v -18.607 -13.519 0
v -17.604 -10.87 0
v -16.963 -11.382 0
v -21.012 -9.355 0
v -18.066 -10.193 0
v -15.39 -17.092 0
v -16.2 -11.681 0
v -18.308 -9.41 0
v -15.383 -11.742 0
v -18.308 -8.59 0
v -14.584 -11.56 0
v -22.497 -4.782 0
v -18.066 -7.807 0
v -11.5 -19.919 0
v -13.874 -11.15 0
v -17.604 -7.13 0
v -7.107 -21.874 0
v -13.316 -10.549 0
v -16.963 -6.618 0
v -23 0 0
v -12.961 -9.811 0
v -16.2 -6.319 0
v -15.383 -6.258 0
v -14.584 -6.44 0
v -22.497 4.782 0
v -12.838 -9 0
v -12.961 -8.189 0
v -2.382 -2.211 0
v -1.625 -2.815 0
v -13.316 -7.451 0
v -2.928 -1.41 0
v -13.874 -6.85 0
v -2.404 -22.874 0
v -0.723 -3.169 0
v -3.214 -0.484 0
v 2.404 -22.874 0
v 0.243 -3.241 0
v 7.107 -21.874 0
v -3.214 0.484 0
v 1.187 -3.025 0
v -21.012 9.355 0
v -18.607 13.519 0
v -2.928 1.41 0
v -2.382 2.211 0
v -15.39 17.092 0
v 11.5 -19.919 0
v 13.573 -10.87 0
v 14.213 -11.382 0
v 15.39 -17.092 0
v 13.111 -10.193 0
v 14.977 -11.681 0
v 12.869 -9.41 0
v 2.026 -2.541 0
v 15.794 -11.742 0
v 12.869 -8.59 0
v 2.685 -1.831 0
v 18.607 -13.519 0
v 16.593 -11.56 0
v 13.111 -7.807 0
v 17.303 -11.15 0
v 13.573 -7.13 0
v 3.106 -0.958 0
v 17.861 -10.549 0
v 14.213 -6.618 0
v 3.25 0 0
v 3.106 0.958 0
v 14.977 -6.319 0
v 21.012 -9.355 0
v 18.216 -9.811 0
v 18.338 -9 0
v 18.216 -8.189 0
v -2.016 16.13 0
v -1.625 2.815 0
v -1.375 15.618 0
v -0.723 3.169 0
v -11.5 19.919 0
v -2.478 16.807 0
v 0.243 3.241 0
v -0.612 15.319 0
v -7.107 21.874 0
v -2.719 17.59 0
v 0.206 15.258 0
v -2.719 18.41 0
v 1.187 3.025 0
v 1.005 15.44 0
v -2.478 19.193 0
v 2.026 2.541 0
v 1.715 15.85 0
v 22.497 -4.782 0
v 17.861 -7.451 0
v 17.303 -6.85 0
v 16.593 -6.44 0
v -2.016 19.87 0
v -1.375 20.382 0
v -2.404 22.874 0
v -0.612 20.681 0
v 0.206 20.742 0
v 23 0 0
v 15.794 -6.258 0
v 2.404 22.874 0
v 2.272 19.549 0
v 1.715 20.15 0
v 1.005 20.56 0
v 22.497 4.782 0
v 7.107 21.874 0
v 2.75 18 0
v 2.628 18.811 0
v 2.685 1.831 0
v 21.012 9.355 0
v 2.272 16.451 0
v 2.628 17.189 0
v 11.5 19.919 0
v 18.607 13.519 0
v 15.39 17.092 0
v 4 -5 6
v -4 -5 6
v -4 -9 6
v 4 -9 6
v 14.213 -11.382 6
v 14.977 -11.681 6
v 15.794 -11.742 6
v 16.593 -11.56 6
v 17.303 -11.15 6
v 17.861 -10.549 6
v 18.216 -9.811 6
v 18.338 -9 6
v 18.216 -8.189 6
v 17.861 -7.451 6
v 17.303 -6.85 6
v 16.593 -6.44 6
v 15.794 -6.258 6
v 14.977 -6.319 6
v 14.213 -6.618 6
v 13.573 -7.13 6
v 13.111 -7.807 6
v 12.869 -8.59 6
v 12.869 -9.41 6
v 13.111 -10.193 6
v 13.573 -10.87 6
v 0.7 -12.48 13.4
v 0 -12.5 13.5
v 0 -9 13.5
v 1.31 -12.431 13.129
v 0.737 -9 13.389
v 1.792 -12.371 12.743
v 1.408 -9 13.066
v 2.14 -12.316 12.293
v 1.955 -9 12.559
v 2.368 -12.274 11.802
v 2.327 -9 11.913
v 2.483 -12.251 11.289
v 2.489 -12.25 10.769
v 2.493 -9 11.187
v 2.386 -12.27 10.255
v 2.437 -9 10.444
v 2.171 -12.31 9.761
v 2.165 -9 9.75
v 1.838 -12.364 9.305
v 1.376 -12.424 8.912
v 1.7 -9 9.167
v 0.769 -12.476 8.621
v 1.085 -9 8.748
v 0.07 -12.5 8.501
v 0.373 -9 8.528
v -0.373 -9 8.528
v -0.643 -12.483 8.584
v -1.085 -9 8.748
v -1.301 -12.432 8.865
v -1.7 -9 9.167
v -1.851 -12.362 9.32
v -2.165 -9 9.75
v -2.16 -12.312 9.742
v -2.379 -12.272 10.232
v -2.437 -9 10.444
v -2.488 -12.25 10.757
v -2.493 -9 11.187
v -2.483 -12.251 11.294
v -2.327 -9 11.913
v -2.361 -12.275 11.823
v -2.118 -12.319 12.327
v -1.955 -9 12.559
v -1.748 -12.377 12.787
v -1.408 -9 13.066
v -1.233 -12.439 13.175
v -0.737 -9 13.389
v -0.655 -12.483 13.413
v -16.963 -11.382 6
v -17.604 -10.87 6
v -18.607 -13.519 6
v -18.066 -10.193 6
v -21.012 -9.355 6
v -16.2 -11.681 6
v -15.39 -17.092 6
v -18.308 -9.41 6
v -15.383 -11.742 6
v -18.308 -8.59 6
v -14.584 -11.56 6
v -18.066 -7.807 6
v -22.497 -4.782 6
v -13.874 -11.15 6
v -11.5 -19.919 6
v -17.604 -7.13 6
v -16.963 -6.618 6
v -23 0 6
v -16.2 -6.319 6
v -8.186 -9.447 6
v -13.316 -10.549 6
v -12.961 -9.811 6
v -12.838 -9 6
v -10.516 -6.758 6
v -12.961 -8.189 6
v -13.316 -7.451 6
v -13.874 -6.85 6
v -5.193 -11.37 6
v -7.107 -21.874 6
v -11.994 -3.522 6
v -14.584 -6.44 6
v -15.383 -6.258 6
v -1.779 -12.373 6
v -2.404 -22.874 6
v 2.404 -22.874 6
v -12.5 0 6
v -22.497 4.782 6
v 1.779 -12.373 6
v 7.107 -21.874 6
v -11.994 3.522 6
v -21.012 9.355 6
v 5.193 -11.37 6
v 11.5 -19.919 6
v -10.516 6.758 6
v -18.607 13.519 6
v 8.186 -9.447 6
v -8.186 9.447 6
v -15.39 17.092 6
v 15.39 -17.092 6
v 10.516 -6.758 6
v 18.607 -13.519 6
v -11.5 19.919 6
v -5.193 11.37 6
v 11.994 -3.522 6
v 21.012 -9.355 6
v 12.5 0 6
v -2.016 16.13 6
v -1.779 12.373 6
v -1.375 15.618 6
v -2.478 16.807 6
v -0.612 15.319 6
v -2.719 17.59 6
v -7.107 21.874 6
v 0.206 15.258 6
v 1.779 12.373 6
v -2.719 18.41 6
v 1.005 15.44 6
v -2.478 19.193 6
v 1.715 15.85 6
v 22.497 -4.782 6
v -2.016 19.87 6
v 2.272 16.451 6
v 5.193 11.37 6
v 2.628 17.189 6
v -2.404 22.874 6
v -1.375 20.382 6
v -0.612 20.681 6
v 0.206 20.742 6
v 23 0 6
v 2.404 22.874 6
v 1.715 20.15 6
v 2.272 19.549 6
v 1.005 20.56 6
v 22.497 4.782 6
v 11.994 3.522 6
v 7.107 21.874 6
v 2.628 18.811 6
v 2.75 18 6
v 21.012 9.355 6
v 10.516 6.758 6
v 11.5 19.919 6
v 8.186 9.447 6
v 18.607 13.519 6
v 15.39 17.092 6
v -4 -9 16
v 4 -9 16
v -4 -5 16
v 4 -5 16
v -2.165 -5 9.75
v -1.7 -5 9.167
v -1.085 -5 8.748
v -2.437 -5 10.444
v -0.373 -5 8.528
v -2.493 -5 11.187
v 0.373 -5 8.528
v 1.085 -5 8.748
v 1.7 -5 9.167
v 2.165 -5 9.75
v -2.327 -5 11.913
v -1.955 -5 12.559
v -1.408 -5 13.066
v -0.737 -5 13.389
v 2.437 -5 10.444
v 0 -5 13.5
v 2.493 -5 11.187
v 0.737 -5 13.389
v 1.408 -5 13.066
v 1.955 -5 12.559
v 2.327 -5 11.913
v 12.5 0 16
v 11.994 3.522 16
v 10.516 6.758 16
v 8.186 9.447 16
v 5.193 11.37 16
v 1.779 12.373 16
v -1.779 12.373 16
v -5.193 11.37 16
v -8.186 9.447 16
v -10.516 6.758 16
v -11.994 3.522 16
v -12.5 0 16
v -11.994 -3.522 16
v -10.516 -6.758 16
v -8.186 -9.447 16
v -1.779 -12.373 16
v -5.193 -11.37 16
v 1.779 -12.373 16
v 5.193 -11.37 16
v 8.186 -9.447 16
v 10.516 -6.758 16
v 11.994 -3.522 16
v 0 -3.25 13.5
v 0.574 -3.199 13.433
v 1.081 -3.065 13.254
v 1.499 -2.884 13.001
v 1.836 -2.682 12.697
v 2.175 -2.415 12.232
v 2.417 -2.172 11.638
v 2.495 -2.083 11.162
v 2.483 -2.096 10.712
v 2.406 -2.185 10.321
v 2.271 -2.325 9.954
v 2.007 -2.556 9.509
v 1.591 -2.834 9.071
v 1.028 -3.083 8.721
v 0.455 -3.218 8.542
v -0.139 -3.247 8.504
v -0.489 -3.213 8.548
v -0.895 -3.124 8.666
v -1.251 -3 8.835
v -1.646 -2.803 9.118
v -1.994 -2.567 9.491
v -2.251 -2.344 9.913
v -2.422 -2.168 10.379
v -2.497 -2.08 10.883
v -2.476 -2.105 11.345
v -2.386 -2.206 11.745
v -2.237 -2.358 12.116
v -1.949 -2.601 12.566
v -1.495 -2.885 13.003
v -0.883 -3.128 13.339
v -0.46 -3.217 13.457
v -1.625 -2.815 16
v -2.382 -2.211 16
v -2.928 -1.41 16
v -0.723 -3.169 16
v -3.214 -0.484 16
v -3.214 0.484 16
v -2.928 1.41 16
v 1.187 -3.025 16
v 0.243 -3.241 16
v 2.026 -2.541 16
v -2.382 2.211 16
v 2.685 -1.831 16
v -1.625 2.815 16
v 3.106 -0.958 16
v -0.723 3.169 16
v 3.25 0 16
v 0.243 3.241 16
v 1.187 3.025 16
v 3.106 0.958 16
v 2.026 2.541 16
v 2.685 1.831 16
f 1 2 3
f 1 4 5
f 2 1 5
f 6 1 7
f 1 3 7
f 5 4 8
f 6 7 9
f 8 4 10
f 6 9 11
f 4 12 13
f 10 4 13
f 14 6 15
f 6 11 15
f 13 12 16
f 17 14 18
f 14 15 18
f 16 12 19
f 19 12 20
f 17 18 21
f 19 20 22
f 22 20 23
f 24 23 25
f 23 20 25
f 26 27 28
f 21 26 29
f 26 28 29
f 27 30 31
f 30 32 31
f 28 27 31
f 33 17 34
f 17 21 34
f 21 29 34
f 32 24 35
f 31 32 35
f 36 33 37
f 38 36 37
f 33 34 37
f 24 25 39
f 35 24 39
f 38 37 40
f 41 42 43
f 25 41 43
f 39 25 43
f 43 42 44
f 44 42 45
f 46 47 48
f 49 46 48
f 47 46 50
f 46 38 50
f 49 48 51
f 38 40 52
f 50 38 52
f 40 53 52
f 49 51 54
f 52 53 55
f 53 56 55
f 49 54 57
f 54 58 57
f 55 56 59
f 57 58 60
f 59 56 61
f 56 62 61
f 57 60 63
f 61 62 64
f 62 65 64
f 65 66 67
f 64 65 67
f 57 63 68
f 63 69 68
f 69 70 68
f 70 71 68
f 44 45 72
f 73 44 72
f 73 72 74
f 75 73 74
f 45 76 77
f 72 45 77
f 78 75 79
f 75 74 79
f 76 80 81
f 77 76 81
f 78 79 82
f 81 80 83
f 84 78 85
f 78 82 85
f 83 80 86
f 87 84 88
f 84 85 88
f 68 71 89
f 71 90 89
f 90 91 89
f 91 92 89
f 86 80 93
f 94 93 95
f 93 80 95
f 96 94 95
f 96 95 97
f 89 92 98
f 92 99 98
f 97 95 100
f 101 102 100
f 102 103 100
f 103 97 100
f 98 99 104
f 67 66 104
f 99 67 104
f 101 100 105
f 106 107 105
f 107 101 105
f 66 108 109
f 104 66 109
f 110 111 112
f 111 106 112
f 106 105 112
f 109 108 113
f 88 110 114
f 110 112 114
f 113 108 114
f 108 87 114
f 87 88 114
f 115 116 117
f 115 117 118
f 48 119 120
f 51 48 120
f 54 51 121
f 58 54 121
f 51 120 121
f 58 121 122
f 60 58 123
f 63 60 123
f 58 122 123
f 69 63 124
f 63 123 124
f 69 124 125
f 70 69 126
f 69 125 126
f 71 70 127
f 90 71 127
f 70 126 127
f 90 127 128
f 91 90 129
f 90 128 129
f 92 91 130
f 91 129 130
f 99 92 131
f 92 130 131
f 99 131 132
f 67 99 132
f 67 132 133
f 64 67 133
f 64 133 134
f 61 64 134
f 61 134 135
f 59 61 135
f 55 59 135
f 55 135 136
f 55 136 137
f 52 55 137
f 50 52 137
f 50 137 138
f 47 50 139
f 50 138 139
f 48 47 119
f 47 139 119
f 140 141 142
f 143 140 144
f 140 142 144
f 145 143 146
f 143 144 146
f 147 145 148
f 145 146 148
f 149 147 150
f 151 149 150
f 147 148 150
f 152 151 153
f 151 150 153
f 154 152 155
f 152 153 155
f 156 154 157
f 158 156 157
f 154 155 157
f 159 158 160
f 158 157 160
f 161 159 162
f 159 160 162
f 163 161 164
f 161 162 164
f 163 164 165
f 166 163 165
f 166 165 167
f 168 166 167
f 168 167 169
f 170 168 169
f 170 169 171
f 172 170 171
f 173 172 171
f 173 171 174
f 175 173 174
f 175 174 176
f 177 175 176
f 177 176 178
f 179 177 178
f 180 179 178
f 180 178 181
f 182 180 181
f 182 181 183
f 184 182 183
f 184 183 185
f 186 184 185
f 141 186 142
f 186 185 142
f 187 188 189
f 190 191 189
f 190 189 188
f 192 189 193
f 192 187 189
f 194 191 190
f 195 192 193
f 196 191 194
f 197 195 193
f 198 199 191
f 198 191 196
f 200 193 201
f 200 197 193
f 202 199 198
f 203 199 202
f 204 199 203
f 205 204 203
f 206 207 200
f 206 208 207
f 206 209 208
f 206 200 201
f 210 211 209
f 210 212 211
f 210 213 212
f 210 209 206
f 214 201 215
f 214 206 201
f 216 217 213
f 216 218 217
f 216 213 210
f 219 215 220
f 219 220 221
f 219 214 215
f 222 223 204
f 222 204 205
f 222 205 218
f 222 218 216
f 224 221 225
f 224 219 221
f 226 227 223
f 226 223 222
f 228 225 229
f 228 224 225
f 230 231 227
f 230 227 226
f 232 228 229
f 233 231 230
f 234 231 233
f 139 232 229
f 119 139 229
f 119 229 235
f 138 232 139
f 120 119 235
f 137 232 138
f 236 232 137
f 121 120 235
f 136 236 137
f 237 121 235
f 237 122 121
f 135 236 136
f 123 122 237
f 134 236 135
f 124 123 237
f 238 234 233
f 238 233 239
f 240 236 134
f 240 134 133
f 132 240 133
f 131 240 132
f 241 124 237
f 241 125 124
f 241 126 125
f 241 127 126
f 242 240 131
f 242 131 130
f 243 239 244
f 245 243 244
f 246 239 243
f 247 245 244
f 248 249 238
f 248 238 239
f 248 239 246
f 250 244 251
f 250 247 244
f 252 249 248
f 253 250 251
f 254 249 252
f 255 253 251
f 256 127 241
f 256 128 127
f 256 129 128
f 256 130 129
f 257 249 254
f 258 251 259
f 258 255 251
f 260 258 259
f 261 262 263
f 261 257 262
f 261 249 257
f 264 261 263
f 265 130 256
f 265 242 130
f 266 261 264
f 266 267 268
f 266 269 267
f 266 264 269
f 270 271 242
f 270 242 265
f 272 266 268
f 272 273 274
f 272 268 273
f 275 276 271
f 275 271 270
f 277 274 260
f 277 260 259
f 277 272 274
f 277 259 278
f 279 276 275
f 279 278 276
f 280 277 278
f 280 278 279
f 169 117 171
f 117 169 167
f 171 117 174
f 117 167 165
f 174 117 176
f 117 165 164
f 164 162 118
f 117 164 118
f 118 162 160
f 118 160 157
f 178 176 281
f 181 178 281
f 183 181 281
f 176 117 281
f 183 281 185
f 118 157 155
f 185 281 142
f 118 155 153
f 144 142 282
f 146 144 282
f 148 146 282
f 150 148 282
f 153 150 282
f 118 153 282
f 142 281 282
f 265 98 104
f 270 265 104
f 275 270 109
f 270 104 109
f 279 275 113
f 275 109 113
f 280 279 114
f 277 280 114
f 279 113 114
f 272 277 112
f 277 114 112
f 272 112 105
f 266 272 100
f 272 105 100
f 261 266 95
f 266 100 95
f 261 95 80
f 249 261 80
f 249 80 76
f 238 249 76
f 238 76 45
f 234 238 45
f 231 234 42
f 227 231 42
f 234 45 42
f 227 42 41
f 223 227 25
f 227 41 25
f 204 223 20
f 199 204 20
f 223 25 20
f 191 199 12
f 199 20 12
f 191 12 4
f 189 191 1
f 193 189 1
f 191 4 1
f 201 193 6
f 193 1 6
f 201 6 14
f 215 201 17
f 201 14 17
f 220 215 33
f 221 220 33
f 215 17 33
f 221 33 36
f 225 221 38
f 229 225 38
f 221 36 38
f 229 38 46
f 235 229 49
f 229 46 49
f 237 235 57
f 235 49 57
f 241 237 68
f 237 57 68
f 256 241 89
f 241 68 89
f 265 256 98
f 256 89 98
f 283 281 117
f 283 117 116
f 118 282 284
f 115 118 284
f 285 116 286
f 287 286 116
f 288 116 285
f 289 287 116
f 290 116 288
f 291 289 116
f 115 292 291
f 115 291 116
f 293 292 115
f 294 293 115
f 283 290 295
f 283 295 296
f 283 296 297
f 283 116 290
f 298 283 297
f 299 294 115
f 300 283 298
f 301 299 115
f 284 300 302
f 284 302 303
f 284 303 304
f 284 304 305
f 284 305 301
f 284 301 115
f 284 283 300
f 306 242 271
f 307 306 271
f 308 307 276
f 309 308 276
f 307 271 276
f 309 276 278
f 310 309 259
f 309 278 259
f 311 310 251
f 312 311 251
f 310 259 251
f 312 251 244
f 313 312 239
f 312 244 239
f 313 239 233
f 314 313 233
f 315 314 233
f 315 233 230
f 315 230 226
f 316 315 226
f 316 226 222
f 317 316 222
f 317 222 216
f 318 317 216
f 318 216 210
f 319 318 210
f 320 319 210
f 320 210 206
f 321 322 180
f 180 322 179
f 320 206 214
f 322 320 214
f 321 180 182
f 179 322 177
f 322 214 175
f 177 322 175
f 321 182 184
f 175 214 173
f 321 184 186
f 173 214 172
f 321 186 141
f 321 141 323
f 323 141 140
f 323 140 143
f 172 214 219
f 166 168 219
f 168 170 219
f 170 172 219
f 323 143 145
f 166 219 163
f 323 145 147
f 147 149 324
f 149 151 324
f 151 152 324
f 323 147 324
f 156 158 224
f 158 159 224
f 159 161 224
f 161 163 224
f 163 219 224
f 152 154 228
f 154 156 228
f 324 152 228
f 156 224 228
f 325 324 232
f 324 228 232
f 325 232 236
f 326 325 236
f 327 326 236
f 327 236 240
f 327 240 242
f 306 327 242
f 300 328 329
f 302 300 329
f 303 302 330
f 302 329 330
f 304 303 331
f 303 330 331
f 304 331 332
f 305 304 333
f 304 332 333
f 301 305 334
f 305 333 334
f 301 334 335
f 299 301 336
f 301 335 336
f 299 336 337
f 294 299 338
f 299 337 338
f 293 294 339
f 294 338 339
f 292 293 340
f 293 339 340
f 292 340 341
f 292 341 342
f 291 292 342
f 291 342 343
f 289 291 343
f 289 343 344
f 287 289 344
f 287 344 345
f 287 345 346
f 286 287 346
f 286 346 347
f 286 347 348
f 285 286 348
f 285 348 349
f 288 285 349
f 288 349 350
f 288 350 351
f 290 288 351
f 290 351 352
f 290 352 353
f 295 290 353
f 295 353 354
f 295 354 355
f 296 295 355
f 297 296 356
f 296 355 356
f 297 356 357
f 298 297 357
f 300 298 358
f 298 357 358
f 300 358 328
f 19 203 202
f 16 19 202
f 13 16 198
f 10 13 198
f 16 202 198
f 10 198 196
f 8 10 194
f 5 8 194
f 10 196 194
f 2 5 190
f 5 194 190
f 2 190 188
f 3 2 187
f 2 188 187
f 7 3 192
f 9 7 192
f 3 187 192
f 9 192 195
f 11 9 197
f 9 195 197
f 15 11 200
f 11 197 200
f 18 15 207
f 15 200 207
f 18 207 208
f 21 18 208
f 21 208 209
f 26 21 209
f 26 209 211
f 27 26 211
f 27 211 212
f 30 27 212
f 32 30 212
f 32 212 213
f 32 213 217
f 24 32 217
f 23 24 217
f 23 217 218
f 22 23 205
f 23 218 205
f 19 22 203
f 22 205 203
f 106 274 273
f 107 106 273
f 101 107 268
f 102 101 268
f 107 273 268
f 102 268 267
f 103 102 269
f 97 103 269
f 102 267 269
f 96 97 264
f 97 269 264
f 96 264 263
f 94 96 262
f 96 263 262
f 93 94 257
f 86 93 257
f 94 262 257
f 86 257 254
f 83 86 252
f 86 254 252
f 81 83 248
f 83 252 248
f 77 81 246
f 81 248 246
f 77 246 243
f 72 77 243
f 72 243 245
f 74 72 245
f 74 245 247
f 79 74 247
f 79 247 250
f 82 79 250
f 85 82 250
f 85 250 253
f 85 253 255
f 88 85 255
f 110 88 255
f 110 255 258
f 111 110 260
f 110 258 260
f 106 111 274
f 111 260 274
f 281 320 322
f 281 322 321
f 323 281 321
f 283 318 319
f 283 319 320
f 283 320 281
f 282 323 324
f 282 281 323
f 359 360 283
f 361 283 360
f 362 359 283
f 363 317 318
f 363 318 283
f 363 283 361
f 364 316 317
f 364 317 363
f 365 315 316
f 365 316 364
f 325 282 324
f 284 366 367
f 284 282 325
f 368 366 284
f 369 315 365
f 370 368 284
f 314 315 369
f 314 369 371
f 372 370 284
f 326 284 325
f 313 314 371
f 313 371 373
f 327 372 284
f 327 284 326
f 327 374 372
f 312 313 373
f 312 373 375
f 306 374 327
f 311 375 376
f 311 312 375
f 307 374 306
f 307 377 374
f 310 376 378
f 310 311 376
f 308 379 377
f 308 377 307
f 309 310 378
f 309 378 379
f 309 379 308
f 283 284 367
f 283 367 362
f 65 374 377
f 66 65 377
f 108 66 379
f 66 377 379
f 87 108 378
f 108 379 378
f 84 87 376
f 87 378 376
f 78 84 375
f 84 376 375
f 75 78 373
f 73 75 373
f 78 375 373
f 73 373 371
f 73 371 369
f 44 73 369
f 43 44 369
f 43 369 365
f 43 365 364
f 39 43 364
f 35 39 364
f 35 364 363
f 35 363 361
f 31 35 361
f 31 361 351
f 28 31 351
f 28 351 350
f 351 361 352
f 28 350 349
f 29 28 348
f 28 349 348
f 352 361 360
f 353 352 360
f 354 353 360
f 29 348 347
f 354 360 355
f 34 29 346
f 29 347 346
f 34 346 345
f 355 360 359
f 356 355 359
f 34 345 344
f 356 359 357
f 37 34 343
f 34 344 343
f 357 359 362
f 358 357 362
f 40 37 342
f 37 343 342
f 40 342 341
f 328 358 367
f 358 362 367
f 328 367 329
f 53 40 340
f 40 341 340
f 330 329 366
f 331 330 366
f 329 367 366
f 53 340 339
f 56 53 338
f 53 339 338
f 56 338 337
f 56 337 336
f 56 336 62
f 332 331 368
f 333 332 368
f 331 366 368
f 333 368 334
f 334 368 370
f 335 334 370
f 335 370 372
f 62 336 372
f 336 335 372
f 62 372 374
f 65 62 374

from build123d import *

# Parameters (mm, degrees)
ESQUISSE1_R                  = 23
BOSS_EXTRU_1_DEPTH           = 6
ESQUISSE2_R                  = 12.5
BOSS_EXTRU_2_DEPTH           = 10
ESQUISSE3_R                  = 3.25
ENL_V_MAT_EXTRU_1_DEPTH      = 16
ENL_V_MAT_EXTRU_2_REACH      = 38.249
ENL_V_MAT_EXTRU_2_END_RADIUS = 12.5
ESQUISSE4_R                  = 2.5
ESQUISSE5_R                  = 2.75
ENL_V_MAT_EXTRU_3_DEPTH      = 6
R_P_T_PAR_COURBE1_COUNT      = 3
ENL_V_MAT_EXTRU_4_REACH      = 38.249
ESQUISSE6_W                  = 8
ESQUISSE6_H                  = 4


with BuildPart() as part:
    # Esquisse1 → Boss.-Extru.1 (new body)
    with BuildSketch(Plane.XY):
        Circle(ESQUISSE1_R)
    extrude(amount=BOSS_EXTRU_1_DEPTH)

    # Esquisse2 → Boss.-Extru.2 (add)
    with BuildSketch(Plane.XY.offset(6)):
        Circle(ESQUISSE2_R)
    extrude(amount=BOSS_EXTRU_2_DEPTH)

    # Esquisse3 → Enlèv. mat.-Extru.1 (cut)
    with BuildSketch(Plane.XY.offset(16)):
        Circle(ESQUISSE3_R)
    extrude(amount=-ENL_V_MAT_EXTRU_1_DEPTH, mode=Mode.SUBTRACT)

    # Enlèv. mat.-Extru.2: up to this cylinder (the profile starts inside it)
    enl_v_mat_extru_2_end = Plane(origin=(0, 0, 11), z_dir=(0, 0, -1)) * Cylinder(ENL_V_MAT_EXTRU_2_END_RADIUS, 102.498, mode=Mode.PRIVATE)
    # Esquisse4 → Enlèv. mat.-Extru.2 (cut, up to the surface)
    with BuildSketch(Plane(origin=(0, 0, 0), x_dir=(1, 0, 0), z_dir=(0, 1, 0)), mode=Mode.PRIVATE) as enl_v_mat_extru_2_sk1:
        with Locations(Location((0, -11, 0), (0, 0, 270))):
            Circle(ESQUISSE4_R)
    enl_v_mat_extru_2_tool1 = extrude(enl_v_mat_extru_2_sk1.sketch, amount=-ENL_V_MAT_EXTRU_2_REACH, mode=Mode.PRIVATE) & enl_v_mat_extru_2_end
    add(enl_v_mat_extru_2_tool1.solids().sort_by_distance((0, 0, 11))[0], mode=Mode.SUBTRACT)

    # Esquisse5 → Enlèv. mat.-Extru.3 (cut)
    with BuildSketch(Plane.XY.offset(6)):
        with Locations((0, 18)):
            Circle(ESQUISSE5_R)
    enl_v_mat_extru_3 = extrude(amount=-ENL_V_MAT_EXTRU_3_DEPTH, mode=Mode.SUBTRACT)

    # Répét. par courbe1: Enlèv. mat.-Extru.3 ×3 about axis
    r_p_t_par_courbe1_axis = Axis((0, 0, 6), (0, 0, -1))
    for i in range(1, R_P_T_PAR_COURBE1_COUNT):
        add(enl_v_mat_extru_3.rotate(r_p_t_par_courbe1_axis, i * 360 / R_P_T_PAR_COURBE1_COUNT), mode=Mode.SUBTRACT)

    # Enlèv. mat.-Extru.4: up to this face of the body (flat: up to its plane)
    enl_v_mat_extru_4_end = Plane(part.part.faces().sort_by_distance((-22.349461761, 0, 6))[0])
    # Esquisse6 → Enlèv. mat.-Extru.4 (cut, up to the picked face)
    with BuildSketch(Plane.XY.offset(16), mode=Mode.PRIVATE) as enl_v_mat_extru_4_sk1:
        with Locations((0, -7)):
            Rectangle(ESQUISSE6_W, ESQUISSE6_H)
    enl_v_mat_extru_4_tool1 = split(extrude(enl_v_mat_extru_4_sk1.sketch, amount=-ENL_V_MAT_EXTRU_4_REACH, mode=Mode.PRIVATE), bisect_by=enl_v_mat_extru_4_end, keep=Keep.BOTH, mode=Mode.PRIVATE)
    add(enl_v_mat_extru_4_tool1.solids().sort_by(Axis((0, -7, 16), (0, 0, -1)))[0], mode=Mode.SUBTRACT)


solid = part.part
